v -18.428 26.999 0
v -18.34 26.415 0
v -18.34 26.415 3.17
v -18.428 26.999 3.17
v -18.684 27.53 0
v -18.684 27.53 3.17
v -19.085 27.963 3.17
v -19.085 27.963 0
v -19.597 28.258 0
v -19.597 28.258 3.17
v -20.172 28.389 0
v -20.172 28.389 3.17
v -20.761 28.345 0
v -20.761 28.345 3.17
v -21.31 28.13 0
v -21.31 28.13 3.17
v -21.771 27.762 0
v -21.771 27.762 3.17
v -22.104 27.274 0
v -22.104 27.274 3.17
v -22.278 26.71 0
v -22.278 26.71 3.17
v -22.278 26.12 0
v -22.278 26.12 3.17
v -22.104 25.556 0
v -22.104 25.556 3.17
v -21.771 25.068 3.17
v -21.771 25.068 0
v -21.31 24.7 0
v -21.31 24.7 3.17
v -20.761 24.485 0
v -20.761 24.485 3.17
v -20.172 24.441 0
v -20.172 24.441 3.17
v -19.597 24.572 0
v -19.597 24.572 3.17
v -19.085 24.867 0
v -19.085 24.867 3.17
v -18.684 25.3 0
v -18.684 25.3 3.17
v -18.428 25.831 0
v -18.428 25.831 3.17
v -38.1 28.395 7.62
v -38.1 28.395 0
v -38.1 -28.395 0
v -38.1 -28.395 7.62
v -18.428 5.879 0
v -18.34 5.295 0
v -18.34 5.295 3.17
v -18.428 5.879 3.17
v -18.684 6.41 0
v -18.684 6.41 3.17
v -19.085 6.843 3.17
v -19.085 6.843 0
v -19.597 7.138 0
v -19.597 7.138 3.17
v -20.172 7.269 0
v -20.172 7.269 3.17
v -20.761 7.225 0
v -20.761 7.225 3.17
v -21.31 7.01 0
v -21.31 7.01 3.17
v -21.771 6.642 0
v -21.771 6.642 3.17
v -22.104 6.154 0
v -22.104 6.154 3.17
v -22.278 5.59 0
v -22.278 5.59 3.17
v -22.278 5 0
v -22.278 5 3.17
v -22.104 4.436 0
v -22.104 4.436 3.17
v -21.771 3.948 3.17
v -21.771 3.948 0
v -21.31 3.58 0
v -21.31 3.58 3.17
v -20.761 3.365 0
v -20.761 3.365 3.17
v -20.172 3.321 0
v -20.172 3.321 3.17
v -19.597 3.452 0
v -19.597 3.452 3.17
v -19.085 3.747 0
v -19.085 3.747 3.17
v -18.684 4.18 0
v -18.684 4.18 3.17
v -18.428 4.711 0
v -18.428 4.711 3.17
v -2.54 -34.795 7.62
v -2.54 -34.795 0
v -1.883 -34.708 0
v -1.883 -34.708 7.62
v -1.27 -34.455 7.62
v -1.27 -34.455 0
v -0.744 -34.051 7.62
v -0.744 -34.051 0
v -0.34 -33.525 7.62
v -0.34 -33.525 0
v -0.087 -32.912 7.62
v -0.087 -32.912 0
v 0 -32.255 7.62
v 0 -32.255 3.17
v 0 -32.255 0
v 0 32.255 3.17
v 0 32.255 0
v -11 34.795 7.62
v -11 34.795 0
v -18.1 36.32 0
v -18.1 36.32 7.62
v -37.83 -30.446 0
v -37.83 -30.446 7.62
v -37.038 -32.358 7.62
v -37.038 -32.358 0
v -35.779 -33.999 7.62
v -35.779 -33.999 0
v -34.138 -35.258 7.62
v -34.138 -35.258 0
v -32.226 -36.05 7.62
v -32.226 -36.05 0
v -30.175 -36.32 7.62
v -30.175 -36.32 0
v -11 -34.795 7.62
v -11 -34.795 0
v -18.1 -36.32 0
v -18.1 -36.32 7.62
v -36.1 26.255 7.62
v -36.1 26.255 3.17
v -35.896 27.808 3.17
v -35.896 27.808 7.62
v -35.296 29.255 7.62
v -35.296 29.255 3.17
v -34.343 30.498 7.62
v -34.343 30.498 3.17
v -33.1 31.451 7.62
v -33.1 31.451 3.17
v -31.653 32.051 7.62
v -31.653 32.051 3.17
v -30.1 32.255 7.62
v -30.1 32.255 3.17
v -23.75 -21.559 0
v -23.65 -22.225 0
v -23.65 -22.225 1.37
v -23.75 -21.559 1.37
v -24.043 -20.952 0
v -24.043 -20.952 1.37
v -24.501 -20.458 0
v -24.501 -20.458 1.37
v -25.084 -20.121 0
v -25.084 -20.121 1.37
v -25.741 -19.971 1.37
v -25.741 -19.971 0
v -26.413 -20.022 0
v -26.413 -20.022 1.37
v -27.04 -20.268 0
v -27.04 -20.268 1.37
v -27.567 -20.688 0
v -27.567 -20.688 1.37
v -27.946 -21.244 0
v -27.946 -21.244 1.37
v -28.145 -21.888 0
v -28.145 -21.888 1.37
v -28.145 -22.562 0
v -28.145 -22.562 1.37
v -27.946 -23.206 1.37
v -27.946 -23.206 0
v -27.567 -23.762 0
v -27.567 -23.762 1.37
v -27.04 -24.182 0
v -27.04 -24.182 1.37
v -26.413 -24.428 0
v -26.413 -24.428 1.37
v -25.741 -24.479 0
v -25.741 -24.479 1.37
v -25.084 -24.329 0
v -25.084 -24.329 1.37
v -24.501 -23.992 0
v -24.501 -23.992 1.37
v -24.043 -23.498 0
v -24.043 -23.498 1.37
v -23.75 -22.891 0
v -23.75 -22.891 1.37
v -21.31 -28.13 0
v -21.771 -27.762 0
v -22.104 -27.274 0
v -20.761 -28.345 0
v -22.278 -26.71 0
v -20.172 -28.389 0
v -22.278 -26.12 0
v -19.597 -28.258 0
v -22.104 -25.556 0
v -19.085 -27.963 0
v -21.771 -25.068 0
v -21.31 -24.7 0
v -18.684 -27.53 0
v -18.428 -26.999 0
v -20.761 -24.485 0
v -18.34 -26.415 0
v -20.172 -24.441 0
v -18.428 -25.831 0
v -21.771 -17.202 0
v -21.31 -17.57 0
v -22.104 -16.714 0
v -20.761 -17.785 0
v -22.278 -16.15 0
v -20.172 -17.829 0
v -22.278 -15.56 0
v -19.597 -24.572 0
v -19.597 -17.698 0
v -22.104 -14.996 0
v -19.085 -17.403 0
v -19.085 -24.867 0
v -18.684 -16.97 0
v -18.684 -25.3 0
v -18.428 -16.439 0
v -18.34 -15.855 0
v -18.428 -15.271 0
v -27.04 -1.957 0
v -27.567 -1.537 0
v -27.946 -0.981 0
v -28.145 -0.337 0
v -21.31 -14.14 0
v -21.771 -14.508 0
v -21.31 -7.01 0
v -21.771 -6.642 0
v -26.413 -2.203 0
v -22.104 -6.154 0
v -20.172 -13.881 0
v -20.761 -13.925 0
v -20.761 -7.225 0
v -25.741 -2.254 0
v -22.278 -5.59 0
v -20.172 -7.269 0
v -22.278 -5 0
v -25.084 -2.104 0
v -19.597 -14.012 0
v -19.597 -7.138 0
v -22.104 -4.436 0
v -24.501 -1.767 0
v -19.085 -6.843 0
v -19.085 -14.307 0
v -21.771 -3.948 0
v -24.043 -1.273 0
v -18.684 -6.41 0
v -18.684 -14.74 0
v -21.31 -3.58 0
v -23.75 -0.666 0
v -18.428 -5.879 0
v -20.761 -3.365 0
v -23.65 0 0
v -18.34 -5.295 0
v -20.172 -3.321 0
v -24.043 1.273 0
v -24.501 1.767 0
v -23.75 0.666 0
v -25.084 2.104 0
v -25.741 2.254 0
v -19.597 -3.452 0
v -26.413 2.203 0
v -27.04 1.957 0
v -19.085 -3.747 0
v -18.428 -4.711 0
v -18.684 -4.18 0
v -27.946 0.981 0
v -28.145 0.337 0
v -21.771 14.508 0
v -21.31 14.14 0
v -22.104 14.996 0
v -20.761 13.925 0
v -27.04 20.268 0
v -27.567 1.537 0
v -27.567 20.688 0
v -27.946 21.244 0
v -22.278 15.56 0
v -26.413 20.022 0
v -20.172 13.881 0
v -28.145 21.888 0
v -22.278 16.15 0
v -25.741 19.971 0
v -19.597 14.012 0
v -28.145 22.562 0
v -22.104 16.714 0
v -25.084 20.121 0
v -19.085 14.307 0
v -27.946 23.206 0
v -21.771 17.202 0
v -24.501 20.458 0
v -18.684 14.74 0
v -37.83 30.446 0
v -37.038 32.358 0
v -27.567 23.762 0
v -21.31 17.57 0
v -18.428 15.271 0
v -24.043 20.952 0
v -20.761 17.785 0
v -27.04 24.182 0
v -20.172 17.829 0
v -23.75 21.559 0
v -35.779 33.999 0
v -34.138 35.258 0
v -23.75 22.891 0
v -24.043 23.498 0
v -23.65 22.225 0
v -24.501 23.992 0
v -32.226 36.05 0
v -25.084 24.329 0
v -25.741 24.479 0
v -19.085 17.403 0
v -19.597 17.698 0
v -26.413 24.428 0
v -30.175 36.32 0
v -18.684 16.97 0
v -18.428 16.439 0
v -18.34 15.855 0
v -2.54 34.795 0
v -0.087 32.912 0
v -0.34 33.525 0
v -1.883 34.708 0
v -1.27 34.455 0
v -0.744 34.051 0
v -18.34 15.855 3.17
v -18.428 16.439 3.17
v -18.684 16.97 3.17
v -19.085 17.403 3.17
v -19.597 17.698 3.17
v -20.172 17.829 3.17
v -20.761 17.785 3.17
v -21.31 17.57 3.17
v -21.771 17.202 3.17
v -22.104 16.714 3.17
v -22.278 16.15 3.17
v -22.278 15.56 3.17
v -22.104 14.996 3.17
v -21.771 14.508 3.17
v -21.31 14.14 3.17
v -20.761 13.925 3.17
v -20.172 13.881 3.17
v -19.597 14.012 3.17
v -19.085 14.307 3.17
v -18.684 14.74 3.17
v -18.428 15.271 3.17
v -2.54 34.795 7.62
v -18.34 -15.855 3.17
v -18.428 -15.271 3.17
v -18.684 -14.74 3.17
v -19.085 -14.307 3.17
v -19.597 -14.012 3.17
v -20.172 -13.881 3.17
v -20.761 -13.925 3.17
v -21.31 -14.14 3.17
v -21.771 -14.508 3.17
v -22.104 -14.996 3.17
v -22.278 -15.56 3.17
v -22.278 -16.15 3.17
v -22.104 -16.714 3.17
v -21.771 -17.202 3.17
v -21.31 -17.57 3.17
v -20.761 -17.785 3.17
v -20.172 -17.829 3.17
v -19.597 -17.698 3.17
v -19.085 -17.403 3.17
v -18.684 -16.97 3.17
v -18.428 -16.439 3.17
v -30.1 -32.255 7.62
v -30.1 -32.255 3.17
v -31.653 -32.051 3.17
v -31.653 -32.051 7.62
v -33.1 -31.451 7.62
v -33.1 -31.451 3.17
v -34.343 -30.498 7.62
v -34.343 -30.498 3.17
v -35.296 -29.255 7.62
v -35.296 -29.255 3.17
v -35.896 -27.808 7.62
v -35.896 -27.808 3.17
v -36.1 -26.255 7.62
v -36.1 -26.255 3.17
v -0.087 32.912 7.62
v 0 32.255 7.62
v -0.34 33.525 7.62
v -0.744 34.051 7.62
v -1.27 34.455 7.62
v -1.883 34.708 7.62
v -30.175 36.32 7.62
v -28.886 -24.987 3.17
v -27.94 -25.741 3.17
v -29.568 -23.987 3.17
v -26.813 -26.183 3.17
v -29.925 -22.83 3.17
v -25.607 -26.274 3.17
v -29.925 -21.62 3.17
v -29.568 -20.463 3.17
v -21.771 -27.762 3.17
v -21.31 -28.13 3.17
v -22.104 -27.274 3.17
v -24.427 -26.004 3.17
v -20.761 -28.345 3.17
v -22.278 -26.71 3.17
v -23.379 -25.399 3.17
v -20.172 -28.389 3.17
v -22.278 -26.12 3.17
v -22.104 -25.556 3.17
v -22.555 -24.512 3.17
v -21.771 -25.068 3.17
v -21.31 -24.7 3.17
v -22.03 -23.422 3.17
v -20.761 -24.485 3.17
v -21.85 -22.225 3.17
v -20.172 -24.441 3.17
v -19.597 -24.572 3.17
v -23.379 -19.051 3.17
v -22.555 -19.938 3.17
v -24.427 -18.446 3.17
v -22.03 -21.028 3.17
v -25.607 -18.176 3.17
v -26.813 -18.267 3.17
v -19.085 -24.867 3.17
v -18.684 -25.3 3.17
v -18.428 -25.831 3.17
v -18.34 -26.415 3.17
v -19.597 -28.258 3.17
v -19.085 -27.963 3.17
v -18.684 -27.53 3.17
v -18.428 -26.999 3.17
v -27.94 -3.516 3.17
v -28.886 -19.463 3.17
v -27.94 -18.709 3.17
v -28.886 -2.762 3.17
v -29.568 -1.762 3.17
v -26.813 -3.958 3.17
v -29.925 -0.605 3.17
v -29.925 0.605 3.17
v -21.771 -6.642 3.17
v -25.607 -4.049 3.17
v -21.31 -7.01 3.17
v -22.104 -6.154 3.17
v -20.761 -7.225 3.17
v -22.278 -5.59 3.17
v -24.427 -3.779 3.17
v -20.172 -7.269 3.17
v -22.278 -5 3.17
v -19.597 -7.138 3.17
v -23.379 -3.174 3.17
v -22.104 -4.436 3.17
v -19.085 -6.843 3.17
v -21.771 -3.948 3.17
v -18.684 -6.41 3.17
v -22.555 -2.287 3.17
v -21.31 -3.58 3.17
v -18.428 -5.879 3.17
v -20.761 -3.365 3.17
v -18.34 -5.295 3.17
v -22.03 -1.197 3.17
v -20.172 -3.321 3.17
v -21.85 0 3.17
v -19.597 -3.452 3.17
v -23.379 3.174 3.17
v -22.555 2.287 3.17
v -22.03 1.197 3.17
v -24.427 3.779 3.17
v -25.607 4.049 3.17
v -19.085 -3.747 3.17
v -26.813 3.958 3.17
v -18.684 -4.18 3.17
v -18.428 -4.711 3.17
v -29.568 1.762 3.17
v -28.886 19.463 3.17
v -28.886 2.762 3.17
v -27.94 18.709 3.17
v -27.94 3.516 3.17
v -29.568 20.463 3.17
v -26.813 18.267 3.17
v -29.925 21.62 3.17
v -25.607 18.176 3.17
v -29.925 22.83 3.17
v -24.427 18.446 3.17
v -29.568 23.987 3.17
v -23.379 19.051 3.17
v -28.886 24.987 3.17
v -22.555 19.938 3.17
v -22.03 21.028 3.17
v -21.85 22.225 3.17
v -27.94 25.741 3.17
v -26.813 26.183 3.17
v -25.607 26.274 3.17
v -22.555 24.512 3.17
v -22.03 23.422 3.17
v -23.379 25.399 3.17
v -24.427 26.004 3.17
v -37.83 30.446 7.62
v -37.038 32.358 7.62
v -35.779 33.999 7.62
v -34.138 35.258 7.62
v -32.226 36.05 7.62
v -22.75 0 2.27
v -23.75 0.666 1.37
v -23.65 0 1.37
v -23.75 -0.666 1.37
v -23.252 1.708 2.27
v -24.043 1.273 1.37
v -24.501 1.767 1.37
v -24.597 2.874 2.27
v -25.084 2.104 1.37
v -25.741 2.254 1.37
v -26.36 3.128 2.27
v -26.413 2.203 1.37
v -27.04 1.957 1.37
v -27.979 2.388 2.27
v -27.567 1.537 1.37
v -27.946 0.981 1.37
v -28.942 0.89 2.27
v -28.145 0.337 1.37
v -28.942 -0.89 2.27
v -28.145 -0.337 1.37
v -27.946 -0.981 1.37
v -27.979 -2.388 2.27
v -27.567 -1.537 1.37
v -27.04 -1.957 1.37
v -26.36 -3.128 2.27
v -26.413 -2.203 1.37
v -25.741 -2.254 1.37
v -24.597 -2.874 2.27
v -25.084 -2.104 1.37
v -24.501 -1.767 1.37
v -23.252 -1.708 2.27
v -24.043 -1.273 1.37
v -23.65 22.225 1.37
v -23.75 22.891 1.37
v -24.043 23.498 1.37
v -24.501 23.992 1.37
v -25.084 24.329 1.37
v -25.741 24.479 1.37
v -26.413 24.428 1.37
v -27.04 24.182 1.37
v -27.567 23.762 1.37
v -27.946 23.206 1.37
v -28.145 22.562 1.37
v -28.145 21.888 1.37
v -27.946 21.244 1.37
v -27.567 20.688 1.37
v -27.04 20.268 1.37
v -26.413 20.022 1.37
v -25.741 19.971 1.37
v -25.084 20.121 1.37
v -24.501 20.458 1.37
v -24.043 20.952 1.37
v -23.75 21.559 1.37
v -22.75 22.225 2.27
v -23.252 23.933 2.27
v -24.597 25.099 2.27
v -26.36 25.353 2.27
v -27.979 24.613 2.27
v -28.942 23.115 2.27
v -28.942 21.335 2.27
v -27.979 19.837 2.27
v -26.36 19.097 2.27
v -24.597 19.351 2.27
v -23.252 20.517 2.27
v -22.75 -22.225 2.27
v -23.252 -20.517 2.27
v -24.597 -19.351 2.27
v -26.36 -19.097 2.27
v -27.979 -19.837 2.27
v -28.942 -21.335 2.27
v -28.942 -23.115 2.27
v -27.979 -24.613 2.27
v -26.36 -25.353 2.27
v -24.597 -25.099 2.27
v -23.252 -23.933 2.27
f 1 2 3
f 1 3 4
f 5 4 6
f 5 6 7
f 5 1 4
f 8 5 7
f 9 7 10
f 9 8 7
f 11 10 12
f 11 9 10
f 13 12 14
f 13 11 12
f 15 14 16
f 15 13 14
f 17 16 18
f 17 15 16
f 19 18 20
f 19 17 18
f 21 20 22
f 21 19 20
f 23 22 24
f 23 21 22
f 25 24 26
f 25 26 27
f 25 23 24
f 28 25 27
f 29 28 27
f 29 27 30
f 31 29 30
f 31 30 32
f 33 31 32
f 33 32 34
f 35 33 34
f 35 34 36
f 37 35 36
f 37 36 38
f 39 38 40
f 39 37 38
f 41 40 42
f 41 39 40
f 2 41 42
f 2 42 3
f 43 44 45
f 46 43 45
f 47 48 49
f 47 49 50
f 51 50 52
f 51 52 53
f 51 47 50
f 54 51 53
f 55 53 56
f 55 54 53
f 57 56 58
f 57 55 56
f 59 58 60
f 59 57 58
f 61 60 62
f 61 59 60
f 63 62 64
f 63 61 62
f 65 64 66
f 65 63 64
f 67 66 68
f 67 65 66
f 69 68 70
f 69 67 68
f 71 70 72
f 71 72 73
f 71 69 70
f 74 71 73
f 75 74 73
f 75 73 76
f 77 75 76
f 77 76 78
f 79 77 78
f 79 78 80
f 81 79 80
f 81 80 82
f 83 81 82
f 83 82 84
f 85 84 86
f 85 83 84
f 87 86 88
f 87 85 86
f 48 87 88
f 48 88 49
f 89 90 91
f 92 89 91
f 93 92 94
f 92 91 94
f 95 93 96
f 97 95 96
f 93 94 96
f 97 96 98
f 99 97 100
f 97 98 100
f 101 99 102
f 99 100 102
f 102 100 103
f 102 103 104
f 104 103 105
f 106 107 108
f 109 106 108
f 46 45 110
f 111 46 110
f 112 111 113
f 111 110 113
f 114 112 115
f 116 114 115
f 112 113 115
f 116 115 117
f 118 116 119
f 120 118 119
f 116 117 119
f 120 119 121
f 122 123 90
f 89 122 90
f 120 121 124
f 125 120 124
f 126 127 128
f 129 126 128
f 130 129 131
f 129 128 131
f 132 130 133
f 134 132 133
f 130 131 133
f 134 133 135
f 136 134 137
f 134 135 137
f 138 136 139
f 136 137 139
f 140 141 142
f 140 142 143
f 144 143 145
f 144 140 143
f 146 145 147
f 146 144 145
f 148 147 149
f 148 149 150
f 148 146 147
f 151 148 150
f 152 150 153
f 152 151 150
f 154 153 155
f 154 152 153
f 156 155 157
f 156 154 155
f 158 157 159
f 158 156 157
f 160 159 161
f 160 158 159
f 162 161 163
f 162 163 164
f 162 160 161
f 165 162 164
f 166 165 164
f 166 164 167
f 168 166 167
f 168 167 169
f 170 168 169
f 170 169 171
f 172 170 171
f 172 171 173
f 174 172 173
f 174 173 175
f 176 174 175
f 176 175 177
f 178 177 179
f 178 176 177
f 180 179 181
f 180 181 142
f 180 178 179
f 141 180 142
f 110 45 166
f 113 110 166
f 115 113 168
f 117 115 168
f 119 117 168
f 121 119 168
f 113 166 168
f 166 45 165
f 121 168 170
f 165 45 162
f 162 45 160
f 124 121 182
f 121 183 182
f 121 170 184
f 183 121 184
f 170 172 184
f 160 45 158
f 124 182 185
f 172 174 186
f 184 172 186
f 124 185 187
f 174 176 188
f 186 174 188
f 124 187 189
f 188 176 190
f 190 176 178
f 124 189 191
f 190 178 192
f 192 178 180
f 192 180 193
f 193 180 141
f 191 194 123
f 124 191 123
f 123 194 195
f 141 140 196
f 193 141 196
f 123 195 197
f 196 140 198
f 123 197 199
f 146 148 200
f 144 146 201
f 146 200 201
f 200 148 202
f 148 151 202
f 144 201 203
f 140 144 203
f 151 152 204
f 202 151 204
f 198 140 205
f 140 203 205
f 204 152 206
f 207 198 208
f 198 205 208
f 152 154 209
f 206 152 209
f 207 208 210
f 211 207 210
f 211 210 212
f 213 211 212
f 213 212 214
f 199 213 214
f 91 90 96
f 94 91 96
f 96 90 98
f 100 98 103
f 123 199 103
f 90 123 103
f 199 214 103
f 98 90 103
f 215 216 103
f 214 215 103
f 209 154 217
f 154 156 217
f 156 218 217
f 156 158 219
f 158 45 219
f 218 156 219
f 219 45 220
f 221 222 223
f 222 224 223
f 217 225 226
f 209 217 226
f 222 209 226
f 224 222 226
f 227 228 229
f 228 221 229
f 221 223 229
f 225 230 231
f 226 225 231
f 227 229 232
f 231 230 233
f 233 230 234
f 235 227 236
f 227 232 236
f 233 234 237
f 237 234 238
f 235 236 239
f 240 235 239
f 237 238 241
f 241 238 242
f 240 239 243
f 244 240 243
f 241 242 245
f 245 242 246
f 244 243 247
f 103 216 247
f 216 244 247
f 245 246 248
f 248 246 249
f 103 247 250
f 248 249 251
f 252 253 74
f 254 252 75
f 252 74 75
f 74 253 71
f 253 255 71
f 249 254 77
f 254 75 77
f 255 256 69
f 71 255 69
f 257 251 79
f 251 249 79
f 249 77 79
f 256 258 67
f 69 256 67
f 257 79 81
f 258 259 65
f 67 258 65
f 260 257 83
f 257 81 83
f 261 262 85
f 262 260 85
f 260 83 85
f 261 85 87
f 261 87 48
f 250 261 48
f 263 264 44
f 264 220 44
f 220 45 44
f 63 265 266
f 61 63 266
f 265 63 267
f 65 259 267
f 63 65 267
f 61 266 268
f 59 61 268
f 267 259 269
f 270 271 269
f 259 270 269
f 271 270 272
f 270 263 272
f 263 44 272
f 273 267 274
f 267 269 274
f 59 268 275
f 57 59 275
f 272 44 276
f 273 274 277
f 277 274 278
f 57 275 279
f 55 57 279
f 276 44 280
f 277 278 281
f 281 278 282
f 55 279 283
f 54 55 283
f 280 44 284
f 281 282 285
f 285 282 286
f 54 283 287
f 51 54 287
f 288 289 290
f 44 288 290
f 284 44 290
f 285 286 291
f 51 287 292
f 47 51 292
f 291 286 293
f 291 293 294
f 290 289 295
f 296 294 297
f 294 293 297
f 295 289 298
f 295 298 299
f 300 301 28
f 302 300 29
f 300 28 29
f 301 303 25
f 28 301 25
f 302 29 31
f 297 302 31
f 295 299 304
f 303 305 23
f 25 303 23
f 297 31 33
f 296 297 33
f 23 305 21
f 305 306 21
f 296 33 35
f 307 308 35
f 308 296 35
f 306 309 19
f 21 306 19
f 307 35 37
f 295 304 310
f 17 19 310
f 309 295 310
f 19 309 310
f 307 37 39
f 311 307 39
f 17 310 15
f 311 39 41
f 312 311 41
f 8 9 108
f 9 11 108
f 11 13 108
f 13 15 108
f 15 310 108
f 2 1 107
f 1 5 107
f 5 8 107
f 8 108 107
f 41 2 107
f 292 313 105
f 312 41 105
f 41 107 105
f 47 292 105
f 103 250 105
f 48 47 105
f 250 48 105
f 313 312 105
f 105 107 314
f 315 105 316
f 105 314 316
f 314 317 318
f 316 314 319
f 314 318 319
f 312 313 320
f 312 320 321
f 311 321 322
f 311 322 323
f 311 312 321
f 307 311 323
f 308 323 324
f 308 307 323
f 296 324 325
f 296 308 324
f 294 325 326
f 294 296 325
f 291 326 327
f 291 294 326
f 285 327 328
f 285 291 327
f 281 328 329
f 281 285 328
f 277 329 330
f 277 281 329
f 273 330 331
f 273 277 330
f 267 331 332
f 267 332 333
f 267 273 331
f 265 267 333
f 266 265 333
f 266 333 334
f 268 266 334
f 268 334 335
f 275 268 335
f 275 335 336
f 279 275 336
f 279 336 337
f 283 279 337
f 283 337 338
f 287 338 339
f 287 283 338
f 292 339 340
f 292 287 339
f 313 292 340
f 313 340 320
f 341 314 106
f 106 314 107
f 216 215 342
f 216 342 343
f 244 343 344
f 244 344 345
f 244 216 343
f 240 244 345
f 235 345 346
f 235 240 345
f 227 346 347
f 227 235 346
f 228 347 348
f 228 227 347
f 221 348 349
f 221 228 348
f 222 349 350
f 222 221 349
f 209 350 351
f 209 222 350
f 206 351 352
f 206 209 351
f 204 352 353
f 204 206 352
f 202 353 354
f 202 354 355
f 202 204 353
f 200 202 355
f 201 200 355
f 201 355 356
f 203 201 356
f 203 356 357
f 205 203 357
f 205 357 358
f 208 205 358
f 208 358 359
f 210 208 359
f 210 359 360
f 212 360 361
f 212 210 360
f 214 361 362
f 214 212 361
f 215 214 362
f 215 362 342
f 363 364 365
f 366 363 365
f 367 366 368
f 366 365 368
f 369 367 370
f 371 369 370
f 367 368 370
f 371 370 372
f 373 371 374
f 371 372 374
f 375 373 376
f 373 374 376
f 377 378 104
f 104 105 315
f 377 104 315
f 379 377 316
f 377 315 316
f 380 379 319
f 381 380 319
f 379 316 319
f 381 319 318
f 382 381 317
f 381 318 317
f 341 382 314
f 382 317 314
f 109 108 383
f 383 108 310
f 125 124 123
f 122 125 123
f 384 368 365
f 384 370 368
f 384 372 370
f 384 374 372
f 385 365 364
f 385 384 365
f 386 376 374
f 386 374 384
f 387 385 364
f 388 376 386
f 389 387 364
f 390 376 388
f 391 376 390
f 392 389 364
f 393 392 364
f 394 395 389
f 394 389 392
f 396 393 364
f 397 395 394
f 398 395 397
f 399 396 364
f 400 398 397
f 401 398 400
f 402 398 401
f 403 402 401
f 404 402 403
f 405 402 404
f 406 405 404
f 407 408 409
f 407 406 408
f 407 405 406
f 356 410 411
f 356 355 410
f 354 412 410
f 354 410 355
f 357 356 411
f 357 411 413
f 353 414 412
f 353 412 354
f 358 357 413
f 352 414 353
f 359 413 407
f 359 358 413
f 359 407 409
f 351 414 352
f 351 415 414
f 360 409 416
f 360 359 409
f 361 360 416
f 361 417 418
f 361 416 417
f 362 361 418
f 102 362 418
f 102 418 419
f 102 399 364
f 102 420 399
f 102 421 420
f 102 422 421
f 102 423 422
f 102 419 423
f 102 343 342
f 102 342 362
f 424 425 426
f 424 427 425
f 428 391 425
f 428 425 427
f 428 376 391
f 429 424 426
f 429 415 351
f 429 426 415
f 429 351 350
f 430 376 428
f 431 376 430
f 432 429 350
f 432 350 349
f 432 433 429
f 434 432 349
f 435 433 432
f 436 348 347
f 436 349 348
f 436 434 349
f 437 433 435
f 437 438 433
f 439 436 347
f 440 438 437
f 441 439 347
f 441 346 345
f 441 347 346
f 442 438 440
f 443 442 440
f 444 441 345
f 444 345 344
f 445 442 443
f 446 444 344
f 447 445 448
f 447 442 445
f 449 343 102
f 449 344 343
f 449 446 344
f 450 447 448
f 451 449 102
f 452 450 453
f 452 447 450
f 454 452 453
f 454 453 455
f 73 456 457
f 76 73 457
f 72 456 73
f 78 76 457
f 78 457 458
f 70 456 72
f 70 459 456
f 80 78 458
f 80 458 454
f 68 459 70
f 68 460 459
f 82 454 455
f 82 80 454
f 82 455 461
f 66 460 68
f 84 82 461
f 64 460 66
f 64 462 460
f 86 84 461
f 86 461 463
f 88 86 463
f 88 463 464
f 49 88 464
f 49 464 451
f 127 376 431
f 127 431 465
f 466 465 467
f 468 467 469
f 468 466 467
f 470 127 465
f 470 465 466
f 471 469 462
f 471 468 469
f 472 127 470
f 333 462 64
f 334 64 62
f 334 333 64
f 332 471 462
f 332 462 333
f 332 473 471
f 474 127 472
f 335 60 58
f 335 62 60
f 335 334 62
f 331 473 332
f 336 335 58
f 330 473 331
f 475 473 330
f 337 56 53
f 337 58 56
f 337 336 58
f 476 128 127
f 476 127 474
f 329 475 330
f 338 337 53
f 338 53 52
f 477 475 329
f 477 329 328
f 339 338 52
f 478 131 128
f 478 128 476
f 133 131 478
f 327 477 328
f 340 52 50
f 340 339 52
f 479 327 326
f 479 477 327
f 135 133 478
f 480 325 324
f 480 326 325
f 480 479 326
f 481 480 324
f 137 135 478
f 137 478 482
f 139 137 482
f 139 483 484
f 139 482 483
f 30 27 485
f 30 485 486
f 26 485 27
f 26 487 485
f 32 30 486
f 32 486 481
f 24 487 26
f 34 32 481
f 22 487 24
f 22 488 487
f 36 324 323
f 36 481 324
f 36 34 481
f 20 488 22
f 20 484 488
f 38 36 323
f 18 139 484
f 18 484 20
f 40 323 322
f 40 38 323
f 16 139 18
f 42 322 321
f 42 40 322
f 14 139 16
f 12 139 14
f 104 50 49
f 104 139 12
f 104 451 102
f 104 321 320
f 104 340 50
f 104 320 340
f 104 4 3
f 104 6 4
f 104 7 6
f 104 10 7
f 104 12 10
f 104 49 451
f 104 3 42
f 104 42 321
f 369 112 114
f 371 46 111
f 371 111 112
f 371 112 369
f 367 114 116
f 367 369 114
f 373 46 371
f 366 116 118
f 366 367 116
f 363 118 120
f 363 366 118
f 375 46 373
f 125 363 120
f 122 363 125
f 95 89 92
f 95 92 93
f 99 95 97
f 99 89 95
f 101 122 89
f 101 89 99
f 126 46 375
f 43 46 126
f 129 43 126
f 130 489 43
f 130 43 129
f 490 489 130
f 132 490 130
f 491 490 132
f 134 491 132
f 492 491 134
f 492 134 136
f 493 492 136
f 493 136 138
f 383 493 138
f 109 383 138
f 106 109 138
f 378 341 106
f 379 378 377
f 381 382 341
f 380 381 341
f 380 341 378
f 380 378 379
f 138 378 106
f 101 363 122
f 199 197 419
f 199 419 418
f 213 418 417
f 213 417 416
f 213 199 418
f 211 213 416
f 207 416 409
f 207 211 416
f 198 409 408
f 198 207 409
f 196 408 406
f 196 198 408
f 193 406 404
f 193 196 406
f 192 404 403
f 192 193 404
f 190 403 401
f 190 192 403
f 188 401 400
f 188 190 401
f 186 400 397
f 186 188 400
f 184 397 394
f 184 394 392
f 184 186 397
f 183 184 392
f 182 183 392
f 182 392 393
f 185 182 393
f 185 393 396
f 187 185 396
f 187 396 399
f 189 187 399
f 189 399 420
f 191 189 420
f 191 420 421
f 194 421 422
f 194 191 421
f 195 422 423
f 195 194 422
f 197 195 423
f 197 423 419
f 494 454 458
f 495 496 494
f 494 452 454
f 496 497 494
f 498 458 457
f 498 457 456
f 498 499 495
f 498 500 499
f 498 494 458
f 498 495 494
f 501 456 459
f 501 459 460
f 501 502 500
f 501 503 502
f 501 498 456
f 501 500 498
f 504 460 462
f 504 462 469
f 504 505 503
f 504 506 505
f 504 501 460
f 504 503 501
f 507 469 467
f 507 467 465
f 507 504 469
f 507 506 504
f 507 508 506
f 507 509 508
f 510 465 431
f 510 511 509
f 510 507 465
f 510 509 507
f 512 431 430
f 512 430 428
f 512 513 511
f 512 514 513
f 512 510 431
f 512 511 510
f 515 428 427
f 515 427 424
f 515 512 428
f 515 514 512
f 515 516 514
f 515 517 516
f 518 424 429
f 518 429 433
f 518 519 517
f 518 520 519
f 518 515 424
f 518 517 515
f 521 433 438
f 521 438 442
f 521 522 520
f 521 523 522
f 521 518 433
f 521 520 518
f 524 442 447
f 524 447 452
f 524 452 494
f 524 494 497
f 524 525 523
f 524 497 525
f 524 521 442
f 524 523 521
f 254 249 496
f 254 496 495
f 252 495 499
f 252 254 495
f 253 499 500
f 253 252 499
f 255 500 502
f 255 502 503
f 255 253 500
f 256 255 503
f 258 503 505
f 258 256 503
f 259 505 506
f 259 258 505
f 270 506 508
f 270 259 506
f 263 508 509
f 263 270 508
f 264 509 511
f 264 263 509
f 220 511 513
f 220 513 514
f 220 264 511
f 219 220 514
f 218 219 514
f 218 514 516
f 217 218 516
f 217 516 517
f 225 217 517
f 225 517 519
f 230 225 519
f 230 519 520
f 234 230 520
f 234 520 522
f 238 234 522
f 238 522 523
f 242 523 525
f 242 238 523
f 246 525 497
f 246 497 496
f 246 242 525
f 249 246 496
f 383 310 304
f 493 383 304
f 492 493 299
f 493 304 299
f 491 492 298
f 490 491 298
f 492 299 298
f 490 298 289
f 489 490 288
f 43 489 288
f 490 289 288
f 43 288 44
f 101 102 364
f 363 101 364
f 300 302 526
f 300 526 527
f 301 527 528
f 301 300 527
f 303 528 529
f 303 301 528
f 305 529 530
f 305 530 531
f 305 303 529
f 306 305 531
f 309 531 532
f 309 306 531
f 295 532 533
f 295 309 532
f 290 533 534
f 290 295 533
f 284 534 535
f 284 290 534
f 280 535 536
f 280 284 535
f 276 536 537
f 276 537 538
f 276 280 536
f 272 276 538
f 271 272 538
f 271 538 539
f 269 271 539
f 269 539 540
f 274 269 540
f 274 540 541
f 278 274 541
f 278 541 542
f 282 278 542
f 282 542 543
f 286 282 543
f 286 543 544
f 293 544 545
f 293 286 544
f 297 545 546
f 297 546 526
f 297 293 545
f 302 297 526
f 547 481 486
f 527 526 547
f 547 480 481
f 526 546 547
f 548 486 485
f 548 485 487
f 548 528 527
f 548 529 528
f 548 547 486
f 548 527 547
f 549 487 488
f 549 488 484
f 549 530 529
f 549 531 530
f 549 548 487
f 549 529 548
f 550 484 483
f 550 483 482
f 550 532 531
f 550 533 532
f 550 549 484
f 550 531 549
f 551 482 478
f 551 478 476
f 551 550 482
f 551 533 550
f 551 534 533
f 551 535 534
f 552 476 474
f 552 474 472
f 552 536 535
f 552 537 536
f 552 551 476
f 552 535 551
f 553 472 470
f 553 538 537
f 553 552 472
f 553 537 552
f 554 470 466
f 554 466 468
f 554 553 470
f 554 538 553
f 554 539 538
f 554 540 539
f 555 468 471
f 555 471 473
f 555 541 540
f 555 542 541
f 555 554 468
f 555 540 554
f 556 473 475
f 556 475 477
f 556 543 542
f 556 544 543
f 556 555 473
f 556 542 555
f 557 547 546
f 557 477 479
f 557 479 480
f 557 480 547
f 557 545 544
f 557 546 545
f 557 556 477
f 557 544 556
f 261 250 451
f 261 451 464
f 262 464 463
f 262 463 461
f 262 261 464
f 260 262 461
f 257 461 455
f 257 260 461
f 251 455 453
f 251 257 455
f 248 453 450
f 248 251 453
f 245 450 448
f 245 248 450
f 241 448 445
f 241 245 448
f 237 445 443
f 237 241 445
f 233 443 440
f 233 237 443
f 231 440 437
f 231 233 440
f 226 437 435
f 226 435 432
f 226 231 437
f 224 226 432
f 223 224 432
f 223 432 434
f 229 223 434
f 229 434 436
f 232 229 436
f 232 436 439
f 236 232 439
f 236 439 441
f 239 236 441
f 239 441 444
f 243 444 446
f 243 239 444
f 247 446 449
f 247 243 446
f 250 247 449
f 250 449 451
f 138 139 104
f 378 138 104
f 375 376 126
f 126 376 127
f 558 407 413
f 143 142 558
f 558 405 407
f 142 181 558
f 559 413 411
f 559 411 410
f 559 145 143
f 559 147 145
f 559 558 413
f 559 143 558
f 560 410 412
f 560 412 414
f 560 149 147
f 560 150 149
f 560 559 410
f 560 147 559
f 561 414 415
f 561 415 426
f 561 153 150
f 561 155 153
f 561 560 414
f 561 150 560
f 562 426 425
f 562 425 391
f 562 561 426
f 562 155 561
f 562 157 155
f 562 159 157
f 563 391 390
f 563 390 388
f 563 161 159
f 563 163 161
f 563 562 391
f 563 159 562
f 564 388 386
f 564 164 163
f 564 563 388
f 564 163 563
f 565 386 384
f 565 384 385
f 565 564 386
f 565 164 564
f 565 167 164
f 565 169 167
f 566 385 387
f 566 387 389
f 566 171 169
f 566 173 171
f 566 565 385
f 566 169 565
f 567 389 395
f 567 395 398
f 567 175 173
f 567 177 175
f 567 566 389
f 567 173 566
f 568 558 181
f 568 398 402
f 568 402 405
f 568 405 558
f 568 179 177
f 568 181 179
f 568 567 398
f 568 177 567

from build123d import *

# Parameters (mm, degrees)
F0_R     = 2.26
F0_R_2   = 1.98
F1_DEPTH = 3.17
F2_DEPTH = 7.62
F3_SIZE  = 1.8


with BuildPart() as f1:
    # F0 (on Top) → F1 (new body)
    with BuildSketch(Plane.XY):
        with BuildLine():
            Line((0, -32.255), (0, 0))
            Line((0, 0), (0, 32.255))
            Line((0, 32.255), (-30.1, 32.255))
            ThreePointArc((-30.1, 32.255), (-34.342641, 30.497641), (-36.1, 26.255))
            Line((-36.1, 26.255), (-36.1, -26.255))
            ThreePointArc((-36.1, -26.255), (-34.342641, -30.497641), (-30.1, -32.255))
            Line((-30.1, -32.255), (0, -32.255))
        make_face()
        with Locations((-25.91, -22.225)):
            Circle(F0_R, mode=Mode.SUBTRACT)
        with Locations((-20.32, -26.415)):
            Circle(F0_R_2, mode=Mode.SUBTRACT)
        with Locations((-20.32, -15.855)):
            Circle(F0_R_2, mode=Mode.SUBTRACT)
        with Locations((-20.32, -5.295)):
            Circle(F0_R_2, mode=Mode.SUBTRACT)
        with Locations((-25.91, 0)):
            Circle(F0_R, mode=Mode.SUBTRACT)
        with Locations((-20.32, 5.295)):
            Circle(F0_R_2, mode=Mode.SUBTRACT)
        with Locations((-20.32, 15.855)):
            Circle(F0_R_2, mode=Mode.SUBTRACT)
        with Locations((-25.91, 22.225)):
            Circle(F0_R, mode=Mode.SUBTRACT)
        with Locations((-20.32, 26.415)):
            Circle(F0_R_2, mode=Mode.SUBTRACT)
        with BuildLine():
            Line((-30.1, 32.255), (0, 32.255))
            ThreePointArc((0, 32.255), (-0.743949, 34.051051), (-2.54, 34.795))
            Line((-2.54, 34.795), (-11, 34.795))
            Line((-11, 34.795), (-18.1, 36.32))
            Line((-18.1, 36.32), (-30.1752, 36.32))
            ThreePointArc((-30.1752, 36.32), (-35.77888, 33.99888), (-38.1, 28.3952))
            Line((-38.1, 28.3952), (-38.1, 0))
            Line((-38.1, 0), (-38.1, -28.3952))
            ThreePointArc((-38.1, -28.3952), (-35.77888, -33.99888), (-30.1752, -36.32))
            Line((-30.1752, -36.32), (-18.1, -36.32))
            Line((-18.1, -36.32), (-11, -34.795))
            Line((-11, -34.795), (-2.54, -34.795))
            ThreePointArc((-2.54, -34.795), (-0.743949, -34.051051), (0, -32.255))
            Line((0, -32.255), (-30.1, -32.255))
            ThreePointArc((-30.1, -32.255), (-34.342641, -30.497641), (-36.1, -26.255))
            Line((-36.1, -26.255), (-36.1, 26.255))
            ThreePointArc((-36.1, 26.255), (-34.342641, 30.497641), (-30.1, 32.255))
        make_face()
    extrude(amount=F1_DEPTH)

    # F0 (on Top) → F2 (join)
    with BuildSketch(Plane.XY):
        with BuildLine():
            Line((-30.1, 32.255), (0, 32.255))
            ThreePointArc((0, 32.255), (-0.743949, 34.051051), (-2.54, 34.795))
            Line((-2.54, 34.795), (-11, 34.795))
            Line((-11, 34.795), (-18.1, 36.32))
            Line((-18.1, 36.32), (-30.1752, 36.32))
            ThreePointArc((-30.1752, 36.32), (-35.77888, 33.99888), (-38.1, 28.3952))
            Line((-38.1, 28.3952), (-38.1, 0))
            Line((-38.1, 0), (-38.1, -28.3952))
            ThreePointArc((-38.1, -28.3952), (-35.77888, -33.99888), (-30.1752, -36.32))
            Line((-30.1752, -36.32), (-18.1, -36.32))
            Line((-18.1, -36.32), (-11, -34.795))
            Line((-11, -34.795), (-2.54, -34.795))
            ThreePointArc((-2.54, -34.795), (-0.743949, -34.051051), (0, -32.255))
            Line((0, -32.255), (-30.1, -32.255))
            ThreePointArc((-30.1, -32.255), (-34.342641, -30.497641), (-36.1, -26.255))
            Line((-36.1, -26.255), (-36.1, 26.255))
            ThreePointArc((-36.1, 26.255), (-34.342641, 30.497641), (-30.1, 32.255))
        make_face()
    extrude(amount=F2_DEPTH)

    # F3
    f3_edges = [f1.edges().sort_by_distance(p)[0] for p in [
        (-28.17, -22.225, 3.17),
        (-28.17, 0, 3.17),
        (-28.17, 22.225, 3.17),
    ]]
    chamfer(f3_edges, length=F3_SIZE)


solid = f1.part
